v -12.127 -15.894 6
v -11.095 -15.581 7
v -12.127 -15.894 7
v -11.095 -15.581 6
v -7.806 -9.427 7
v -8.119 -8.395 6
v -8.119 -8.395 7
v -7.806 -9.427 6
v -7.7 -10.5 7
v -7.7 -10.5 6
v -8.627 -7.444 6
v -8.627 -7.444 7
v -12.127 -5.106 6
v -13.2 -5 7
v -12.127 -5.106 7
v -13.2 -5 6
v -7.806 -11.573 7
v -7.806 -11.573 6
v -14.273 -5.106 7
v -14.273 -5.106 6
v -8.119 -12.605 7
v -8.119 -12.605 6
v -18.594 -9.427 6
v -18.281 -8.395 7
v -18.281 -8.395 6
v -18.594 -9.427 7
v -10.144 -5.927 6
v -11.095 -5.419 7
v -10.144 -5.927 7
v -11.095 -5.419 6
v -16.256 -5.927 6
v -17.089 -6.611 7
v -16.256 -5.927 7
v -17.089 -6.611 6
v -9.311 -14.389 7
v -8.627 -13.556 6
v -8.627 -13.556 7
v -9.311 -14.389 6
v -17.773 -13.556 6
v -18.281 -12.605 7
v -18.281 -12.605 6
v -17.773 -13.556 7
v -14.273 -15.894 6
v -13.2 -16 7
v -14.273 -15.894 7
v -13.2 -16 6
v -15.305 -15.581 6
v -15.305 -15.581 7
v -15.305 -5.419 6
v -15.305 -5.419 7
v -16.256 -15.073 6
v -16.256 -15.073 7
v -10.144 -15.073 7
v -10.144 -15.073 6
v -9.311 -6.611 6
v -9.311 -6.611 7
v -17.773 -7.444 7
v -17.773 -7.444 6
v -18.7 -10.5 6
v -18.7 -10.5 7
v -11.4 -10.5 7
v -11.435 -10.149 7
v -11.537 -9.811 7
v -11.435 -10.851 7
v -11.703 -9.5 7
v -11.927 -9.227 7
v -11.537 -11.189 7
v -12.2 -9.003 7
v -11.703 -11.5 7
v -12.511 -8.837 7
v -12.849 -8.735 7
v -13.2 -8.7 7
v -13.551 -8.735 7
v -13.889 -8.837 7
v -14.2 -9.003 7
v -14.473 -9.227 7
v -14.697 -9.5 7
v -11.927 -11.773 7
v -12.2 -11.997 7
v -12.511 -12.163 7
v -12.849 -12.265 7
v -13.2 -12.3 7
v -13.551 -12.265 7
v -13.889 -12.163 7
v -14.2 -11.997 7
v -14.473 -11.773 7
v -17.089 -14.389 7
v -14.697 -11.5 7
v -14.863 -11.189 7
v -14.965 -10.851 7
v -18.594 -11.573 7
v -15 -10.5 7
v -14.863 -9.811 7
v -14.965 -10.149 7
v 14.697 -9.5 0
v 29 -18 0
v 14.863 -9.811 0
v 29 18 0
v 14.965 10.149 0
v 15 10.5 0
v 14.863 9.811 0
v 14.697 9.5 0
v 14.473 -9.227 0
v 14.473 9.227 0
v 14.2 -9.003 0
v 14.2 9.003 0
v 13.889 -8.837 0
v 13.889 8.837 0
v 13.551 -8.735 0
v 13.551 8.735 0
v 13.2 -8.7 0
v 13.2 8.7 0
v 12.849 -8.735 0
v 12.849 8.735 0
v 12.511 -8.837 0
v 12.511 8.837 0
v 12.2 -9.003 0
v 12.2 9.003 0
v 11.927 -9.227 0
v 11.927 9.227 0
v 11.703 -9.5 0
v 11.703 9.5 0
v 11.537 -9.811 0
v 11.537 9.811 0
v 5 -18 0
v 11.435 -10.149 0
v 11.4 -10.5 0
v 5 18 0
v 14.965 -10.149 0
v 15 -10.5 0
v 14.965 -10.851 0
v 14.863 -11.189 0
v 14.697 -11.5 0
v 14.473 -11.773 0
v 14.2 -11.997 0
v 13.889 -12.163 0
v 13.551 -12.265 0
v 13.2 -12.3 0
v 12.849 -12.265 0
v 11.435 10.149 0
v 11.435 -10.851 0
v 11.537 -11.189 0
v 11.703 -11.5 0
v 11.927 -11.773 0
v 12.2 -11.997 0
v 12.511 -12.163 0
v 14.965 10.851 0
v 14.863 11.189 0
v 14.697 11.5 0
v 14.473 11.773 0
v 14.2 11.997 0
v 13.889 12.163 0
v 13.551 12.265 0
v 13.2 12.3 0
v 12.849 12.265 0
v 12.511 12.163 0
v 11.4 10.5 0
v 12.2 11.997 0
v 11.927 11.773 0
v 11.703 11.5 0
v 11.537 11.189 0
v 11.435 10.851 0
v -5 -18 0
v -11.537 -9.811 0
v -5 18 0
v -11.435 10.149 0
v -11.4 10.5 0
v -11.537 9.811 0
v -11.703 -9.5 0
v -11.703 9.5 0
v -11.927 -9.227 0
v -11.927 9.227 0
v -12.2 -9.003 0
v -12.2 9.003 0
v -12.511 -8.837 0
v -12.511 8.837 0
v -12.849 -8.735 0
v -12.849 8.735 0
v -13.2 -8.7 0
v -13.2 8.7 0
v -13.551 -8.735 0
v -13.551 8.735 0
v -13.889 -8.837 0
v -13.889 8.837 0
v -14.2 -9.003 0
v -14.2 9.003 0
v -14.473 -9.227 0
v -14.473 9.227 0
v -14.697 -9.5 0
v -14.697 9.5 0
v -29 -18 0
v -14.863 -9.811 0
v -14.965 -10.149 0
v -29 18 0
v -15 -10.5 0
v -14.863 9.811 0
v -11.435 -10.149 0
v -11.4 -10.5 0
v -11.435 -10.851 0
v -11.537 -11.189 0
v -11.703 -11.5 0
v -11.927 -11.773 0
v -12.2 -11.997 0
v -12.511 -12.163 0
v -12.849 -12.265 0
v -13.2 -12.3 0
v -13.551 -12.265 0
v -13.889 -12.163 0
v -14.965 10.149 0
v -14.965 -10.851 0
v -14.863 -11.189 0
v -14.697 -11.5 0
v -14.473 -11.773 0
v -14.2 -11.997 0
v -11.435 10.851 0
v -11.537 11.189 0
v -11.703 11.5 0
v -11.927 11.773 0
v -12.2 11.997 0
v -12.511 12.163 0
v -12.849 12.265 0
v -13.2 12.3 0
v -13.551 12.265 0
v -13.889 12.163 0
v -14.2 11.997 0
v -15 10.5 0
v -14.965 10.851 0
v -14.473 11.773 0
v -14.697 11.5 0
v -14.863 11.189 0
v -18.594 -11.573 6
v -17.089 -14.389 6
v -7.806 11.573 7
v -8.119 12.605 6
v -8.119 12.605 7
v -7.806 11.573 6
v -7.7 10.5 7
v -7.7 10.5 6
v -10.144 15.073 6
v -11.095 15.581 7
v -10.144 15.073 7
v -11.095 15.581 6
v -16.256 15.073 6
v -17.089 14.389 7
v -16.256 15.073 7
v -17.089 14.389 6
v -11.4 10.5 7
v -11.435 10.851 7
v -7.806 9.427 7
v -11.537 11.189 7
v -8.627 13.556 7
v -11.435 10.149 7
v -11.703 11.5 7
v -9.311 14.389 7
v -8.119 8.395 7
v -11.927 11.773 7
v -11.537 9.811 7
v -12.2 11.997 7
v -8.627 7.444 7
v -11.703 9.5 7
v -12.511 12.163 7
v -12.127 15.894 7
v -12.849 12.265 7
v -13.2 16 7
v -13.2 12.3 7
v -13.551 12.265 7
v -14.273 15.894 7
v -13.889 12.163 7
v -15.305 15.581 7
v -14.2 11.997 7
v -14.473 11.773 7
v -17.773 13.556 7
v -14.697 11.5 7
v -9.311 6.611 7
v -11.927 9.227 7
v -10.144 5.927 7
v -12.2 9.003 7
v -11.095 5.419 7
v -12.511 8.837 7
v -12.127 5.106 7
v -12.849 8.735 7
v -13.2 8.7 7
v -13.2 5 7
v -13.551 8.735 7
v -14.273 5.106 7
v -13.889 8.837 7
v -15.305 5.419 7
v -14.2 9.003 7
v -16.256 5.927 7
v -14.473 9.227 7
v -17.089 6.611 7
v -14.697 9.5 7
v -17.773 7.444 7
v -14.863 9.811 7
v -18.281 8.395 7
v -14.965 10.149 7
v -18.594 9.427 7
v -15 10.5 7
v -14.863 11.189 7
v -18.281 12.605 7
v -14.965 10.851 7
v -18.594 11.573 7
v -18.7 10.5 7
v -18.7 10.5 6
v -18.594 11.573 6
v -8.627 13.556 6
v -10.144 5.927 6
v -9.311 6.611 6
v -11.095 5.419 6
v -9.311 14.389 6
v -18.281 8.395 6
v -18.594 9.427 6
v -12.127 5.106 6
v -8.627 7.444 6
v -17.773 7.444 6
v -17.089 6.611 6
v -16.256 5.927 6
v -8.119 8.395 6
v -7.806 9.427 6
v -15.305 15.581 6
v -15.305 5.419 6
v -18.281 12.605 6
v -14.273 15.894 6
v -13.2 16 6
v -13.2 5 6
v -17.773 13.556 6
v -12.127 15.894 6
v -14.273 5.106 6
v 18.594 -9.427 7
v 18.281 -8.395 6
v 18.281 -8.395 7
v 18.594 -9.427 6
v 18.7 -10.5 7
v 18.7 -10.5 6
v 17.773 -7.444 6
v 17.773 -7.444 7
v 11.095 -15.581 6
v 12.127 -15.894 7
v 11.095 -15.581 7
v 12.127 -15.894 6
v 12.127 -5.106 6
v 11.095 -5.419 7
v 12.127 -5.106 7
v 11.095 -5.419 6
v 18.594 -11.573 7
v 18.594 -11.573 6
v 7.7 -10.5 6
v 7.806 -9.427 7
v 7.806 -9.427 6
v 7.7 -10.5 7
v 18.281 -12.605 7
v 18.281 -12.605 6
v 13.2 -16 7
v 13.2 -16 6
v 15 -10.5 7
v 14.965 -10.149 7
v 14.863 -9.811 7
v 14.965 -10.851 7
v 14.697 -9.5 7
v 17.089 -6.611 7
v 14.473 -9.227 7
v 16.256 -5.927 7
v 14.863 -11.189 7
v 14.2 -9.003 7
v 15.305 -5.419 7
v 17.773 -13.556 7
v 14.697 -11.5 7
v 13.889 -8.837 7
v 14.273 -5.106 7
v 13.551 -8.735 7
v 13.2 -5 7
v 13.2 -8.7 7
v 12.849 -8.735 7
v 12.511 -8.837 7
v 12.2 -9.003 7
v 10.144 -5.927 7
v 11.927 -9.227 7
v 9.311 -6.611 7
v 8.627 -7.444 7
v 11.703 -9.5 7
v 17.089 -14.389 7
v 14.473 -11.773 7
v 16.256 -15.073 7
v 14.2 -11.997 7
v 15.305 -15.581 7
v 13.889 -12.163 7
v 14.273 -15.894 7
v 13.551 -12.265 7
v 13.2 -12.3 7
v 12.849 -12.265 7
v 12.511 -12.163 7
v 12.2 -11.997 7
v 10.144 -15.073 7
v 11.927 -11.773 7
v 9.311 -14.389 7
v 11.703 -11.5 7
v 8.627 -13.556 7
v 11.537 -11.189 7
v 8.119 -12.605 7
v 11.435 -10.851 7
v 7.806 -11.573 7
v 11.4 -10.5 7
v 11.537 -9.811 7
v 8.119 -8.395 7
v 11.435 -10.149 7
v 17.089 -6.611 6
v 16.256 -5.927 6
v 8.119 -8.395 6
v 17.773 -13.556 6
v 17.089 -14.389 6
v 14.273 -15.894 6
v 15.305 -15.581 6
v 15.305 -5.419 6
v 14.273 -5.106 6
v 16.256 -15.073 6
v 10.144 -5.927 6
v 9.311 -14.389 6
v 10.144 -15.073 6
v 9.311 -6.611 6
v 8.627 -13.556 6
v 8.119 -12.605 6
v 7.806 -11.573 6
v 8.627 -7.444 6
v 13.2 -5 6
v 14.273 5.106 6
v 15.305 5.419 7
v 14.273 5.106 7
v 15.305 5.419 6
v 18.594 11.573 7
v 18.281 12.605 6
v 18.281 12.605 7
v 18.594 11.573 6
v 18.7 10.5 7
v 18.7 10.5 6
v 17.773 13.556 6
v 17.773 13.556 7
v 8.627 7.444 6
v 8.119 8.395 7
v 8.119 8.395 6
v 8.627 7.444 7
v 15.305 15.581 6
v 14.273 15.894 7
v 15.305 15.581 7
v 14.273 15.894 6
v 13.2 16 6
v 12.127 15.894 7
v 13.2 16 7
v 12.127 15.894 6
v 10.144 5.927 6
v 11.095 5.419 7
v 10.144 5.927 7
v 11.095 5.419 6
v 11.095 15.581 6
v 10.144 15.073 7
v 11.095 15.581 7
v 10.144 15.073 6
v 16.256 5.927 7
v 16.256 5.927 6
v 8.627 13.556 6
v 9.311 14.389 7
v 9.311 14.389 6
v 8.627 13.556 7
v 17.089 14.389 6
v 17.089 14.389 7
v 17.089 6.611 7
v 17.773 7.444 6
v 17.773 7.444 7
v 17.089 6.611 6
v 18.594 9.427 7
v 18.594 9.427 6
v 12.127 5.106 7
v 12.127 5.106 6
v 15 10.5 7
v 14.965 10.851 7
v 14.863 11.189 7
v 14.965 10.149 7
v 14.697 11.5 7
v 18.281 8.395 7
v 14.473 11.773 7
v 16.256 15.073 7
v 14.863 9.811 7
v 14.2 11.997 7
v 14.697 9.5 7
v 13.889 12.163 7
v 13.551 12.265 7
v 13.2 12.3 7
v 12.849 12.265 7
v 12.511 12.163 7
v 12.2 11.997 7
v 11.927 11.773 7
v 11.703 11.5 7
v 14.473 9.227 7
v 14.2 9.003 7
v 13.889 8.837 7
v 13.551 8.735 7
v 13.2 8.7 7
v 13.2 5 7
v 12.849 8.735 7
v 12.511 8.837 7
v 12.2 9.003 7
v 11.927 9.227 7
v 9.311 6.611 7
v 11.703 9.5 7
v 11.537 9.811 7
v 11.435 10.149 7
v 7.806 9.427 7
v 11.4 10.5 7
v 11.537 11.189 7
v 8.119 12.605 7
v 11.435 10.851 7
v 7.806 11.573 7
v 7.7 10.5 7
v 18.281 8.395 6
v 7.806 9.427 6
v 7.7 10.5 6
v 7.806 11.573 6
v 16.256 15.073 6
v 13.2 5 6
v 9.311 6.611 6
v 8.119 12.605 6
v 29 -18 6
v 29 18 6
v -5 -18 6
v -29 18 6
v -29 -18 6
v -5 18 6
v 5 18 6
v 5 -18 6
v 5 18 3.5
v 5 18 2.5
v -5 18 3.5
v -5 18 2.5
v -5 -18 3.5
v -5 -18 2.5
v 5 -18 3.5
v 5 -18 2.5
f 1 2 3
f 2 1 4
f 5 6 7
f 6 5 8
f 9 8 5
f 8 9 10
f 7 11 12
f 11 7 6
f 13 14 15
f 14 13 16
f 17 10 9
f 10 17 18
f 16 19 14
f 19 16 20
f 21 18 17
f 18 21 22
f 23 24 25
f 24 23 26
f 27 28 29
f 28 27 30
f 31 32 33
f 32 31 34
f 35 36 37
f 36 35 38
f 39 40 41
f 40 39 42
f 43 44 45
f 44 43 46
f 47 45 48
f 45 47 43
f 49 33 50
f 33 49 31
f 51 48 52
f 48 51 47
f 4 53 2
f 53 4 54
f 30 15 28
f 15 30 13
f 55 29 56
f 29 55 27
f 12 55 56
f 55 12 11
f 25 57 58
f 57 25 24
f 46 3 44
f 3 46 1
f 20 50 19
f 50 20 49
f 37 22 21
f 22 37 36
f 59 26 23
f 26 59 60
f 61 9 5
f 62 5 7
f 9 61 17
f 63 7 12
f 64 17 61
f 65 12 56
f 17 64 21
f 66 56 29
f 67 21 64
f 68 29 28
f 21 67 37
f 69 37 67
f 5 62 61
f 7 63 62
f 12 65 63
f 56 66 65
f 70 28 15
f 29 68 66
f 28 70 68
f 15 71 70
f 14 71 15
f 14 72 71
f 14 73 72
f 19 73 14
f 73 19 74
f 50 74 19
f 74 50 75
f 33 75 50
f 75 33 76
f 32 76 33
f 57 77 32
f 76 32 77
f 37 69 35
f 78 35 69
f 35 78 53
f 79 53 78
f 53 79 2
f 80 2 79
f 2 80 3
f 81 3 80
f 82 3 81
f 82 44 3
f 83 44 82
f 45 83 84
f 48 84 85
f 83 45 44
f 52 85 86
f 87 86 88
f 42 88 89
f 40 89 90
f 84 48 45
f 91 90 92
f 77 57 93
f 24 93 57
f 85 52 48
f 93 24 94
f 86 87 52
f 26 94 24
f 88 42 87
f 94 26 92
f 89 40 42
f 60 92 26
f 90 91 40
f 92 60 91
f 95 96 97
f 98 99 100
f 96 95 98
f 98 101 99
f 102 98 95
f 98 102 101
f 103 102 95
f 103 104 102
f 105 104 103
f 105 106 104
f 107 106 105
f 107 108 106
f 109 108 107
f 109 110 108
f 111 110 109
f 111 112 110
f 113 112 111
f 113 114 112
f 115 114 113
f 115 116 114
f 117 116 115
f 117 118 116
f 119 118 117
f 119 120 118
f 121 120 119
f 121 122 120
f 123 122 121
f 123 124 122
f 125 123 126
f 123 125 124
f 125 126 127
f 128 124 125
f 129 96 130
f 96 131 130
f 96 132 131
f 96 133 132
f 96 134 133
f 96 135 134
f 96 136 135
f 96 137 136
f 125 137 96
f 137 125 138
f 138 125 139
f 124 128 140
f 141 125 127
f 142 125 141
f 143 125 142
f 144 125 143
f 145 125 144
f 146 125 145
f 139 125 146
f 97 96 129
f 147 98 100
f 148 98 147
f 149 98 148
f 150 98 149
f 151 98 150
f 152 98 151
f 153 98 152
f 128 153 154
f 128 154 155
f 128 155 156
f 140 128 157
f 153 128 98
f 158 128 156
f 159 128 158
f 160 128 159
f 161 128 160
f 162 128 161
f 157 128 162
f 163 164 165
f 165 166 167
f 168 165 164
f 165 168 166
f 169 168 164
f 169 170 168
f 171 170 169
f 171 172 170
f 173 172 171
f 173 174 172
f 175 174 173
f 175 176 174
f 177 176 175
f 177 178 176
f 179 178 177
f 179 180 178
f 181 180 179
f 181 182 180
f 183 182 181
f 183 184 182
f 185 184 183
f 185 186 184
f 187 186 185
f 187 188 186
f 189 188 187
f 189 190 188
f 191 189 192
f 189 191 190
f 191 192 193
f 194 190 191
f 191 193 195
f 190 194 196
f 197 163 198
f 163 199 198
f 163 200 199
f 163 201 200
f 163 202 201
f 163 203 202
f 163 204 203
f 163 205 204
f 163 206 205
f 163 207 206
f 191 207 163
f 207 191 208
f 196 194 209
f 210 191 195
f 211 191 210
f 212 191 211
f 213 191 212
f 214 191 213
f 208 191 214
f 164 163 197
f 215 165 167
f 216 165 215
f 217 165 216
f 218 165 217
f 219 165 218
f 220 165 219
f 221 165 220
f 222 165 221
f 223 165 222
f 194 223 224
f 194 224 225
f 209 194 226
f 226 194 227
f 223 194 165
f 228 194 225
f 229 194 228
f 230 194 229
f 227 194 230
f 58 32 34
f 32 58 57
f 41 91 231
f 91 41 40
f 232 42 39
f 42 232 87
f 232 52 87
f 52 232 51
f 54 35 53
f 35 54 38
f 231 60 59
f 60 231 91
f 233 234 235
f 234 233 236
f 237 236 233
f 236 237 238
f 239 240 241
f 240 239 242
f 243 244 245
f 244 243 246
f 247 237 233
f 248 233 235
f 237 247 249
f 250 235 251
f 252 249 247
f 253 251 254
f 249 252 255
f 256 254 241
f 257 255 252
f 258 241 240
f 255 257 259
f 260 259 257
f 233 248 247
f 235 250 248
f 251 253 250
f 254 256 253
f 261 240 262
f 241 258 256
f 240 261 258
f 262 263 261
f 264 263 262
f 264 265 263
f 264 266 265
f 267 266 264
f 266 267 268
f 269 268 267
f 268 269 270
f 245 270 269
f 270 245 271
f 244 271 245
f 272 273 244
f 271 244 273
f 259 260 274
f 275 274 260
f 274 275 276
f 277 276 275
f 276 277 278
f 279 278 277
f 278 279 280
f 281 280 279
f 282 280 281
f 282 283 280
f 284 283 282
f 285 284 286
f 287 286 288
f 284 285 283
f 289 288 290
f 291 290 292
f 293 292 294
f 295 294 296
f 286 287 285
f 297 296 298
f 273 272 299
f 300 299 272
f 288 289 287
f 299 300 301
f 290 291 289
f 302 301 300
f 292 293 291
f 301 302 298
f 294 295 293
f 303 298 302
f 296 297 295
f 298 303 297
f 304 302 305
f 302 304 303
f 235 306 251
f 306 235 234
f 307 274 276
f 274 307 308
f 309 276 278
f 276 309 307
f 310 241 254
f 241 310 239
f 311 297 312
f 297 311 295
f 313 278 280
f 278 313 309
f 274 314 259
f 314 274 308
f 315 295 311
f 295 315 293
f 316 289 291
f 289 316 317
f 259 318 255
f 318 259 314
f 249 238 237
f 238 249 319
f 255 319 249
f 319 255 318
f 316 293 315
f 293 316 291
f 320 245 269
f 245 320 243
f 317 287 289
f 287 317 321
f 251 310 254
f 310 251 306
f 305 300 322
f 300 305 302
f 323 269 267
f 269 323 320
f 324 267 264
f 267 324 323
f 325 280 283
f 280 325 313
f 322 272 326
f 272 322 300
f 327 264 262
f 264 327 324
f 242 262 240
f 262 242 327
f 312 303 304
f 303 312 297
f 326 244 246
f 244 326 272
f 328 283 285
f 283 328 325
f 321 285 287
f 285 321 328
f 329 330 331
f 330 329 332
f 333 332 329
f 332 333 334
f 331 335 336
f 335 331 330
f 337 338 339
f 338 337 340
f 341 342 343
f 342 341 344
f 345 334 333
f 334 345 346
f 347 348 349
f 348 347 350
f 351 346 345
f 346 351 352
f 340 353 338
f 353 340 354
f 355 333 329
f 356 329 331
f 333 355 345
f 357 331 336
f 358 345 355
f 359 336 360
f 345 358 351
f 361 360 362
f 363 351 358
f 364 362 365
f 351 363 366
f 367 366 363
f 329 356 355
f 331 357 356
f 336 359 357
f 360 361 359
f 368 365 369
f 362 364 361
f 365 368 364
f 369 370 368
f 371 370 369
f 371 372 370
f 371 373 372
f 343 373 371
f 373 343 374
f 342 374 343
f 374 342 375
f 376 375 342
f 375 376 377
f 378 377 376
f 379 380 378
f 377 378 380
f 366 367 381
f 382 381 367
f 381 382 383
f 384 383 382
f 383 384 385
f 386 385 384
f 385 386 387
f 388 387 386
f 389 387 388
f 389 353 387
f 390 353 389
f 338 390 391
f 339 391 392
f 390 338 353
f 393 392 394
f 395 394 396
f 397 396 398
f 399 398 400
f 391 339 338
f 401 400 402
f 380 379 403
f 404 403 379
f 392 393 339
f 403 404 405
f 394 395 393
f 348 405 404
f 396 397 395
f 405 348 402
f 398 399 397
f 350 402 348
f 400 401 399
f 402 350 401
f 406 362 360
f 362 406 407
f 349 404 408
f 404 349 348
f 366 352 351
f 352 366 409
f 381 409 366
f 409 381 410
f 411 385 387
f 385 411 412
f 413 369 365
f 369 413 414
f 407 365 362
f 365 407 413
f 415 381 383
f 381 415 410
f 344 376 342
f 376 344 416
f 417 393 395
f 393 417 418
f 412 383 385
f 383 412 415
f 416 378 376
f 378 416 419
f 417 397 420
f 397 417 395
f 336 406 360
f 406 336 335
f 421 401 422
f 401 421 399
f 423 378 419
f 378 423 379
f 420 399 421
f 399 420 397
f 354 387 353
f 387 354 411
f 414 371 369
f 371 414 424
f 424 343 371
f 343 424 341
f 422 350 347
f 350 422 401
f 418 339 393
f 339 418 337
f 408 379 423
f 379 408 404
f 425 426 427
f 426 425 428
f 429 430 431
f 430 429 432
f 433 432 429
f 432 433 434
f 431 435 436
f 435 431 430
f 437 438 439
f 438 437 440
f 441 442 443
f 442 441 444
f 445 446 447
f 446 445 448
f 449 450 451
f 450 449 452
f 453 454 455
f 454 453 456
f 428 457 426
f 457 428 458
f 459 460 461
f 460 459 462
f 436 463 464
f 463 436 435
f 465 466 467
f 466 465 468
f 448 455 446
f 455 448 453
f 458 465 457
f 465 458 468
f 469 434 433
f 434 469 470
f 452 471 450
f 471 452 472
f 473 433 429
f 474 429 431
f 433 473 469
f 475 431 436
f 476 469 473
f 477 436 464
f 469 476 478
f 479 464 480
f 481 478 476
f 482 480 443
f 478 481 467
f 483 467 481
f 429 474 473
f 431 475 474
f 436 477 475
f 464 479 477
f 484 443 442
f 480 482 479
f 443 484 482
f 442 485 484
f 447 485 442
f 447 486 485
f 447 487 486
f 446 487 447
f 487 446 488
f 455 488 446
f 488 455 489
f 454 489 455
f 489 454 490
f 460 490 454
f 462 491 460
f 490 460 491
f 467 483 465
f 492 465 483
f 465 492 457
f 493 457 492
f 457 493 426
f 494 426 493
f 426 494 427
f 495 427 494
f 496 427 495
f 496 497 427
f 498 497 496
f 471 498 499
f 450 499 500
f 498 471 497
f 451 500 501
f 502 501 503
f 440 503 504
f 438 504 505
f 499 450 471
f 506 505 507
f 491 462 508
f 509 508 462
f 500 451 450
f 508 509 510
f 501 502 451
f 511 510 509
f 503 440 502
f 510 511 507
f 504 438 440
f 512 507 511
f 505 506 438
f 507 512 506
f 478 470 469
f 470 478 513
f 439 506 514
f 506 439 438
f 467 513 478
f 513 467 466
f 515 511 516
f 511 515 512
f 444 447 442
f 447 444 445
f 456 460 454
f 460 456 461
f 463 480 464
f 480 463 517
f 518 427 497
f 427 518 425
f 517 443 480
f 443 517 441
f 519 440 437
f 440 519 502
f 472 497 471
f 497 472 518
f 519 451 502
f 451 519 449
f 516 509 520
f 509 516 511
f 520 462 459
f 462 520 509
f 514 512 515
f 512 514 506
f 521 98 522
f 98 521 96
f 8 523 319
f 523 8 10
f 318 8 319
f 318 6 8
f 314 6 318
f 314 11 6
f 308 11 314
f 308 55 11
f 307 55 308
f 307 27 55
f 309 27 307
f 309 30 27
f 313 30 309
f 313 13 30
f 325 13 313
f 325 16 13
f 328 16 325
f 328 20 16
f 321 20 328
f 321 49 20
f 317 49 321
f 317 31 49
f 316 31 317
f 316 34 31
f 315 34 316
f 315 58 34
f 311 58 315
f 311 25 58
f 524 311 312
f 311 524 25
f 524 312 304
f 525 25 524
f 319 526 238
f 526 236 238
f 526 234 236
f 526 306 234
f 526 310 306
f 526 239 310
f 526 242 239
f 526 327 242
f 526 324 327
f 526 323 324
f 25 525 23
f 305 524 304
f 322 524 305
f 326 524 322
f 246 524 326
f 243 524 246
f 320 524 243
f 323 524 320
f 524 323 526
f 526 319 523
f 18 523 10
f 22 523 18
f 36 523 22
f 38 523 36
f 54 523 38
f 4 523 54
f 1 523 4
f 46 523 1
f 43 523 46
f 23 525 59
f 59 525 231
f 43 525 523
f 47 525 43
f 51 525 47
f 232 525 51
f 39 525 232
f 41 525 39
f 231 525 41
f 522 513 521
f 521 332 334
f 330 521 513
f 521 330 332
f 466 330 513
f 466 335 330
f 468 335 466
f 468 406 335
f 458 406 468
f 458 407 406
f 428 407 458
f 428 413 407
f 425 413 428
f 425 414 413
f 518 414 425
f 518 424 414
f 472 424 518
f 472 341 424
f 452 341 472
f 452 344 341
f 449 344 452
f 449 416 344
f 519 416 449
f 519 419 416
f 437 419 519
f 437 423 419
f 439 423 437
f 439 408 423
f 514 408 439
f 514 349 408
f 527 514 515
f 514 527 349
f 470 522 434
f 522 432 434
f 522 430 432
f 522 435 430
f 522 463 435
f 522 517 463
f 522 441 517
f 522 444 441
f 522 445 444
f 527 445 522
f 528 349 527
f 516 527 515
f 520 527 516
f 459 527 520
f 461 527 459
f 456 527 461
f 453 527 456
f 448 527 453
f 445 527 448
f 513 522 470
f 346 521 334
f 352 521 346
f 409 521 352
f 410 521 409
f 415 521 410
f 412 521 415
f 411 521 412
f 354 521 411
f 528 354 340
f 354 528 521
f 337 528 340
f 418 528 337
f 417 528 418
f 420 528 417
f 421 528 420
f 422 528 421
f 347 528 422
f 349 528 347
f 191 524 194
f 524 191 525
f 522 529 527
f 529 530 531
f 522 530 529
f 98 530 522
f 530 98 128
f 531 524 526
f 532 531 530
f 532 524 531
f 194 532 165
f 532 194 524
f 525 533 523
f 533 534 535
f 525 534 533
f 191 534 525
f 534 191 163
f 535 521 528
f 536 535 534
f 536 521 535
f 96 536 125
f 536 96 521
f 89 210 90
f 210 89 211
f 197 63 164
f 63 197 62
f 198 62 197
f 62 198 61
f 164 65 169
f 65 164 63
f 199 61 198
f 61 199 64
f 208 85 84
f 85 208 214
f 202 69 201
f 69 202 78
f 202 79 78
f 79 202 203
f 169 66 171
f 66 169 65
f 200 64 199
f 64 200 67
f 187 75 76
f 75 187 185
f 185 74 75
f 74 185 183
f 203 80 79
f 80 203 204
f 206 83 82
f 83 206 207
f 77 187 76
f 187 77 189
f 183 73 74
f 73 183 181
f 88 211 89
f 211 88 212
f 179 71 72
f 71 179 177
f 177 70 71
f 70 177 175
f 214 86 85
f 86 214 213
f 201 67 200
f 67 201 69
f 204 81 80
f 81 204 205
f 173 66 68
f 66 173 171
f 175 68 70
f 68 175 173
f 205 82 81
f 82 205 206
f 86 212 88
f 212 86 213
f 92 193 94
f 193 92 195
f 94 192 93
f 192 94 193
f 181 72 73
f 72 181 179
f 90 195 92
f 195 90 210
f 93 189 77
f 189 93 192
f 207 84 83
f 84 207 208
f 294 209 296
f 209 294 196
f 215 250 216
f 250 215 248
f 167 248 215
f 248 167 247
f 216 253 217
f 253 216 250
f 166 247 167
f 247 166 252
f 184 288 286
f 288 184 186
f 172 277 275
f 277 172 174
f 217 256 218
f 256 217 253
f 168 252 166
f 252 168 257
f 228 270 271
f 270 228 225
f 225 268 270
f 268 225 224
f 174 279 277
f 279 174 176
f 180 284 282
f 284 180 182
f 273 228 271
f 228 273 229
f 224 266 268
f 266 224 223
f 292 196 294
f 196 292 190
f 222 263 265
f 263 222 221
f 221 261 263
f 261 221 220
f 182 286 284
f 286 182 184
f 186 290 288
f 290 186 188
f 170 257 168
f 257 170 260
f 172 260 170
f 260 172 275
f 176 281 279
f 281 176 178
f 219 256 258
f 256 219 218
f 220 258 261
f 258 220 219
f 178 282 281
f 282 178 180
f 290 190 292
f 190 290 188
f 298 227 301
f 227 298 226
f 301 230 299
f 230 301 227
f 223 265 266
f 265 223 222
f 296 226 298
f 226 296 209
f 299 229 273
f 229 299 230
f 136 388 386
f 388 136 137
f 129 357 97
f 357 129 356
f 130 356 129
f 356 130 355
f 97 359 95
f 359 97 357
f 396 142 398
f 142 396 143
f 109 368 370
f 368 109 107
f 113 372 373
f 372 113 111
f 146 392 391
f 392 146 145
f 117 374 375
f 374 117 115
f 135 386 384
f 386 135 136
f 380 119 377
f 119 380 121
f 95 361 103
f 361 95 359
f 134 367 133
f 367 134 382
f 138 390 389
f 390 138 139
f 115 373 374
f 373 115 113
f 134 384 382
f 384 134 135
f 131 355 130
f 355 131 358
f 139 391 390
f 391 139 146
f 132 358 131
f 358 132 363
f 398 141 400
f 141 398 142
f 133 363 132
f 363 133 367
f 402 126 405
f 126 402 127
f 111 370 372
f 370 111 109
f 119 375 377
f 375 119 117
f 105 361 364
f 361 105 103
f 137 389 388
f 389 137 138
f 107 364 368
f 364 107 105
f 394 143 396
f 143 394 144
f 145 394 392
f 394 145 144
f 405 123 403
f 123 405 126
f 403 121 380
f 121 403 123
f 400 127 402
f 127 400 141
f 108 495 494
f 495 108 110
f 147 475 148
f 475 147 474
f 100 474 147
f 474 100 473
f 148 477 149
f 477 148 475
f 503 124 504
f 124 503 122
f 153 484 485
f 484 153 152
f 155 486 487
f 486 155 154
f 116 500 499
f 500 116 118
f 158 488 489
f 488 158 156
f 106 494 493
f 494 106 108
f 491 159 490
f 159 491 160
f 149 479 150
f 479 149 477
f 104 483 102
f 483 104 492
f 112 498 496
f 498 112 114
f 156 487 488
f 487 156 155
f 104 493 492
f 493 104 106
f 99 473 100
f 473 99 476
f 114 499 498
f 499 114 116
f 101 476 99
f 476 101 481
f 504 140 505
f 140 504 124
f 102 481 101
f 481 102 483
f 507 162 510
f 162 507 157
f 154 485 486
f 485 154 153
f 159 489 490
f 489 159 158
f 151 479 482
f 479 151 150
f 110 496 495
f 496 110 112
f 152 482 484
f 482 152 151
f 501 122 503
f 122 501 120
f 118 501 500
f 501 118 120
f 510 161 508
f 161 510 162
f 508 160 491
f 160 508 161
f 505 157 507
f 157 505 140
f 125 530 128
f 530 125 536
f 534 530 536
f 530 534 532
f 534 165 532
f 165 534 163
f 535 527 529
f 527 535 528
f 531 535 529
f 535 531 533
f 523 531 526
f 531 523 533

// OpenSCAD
$fn = 32;

// ----------------------------------------------------------------------
// Living hinge: 58 x 36 mm plates, 1 mm flexible web
// ----------------------------------------------------------------------

// --- parameters (mm) ---
plate_len = 24;           // plate length outside the web
plate_w = 36;             // plate width
thick = 6;                // plate thickness
web_half = 5;             // half width of the flex band
web_t = 1;                // flexible web thickness
web_z = 2.5;              // web position inside the thickness
boss_d = 11;              // screw boss diameter
boss_h = 7;               // screw boss height
boss_x = 13.2;            // screw boss distance from the web
screw_d = 3.6;            // screw hole

difference() {
  union() {
    /* one flat strip, later thinned at the middle */
    translate([-29, -18, 0]) cube([58, 36, 6]);
    /* screw bosses, sunk 0.5 mm into the plates */
    for (sx = [-13.2, 13.2]) {
      for (sy = [-10.5, 10.5]) {
        translate([sx, sy, 0]) cylinder(h = boss_h, d = boss_d);
      }
    }
  }
  /* channel from below: leaves the web on top of it */
  translate([-5, -20.5, -2.5]) cube([10, 41, 5]);
  /* channel from above: thins the web down to web_t */
  translate([-5, -20.5, 3.5]) cube([10, 41, 5]);
  /* screw holes through the bosses */
  for (sx = [-13.2, 13.2]) {
    for (sy = [-10.5, 10.5]) {
      translate([sx, sy, -2.5]) cylinder(h = boss_h + 5, d = screw_d);
    }
  }
}
